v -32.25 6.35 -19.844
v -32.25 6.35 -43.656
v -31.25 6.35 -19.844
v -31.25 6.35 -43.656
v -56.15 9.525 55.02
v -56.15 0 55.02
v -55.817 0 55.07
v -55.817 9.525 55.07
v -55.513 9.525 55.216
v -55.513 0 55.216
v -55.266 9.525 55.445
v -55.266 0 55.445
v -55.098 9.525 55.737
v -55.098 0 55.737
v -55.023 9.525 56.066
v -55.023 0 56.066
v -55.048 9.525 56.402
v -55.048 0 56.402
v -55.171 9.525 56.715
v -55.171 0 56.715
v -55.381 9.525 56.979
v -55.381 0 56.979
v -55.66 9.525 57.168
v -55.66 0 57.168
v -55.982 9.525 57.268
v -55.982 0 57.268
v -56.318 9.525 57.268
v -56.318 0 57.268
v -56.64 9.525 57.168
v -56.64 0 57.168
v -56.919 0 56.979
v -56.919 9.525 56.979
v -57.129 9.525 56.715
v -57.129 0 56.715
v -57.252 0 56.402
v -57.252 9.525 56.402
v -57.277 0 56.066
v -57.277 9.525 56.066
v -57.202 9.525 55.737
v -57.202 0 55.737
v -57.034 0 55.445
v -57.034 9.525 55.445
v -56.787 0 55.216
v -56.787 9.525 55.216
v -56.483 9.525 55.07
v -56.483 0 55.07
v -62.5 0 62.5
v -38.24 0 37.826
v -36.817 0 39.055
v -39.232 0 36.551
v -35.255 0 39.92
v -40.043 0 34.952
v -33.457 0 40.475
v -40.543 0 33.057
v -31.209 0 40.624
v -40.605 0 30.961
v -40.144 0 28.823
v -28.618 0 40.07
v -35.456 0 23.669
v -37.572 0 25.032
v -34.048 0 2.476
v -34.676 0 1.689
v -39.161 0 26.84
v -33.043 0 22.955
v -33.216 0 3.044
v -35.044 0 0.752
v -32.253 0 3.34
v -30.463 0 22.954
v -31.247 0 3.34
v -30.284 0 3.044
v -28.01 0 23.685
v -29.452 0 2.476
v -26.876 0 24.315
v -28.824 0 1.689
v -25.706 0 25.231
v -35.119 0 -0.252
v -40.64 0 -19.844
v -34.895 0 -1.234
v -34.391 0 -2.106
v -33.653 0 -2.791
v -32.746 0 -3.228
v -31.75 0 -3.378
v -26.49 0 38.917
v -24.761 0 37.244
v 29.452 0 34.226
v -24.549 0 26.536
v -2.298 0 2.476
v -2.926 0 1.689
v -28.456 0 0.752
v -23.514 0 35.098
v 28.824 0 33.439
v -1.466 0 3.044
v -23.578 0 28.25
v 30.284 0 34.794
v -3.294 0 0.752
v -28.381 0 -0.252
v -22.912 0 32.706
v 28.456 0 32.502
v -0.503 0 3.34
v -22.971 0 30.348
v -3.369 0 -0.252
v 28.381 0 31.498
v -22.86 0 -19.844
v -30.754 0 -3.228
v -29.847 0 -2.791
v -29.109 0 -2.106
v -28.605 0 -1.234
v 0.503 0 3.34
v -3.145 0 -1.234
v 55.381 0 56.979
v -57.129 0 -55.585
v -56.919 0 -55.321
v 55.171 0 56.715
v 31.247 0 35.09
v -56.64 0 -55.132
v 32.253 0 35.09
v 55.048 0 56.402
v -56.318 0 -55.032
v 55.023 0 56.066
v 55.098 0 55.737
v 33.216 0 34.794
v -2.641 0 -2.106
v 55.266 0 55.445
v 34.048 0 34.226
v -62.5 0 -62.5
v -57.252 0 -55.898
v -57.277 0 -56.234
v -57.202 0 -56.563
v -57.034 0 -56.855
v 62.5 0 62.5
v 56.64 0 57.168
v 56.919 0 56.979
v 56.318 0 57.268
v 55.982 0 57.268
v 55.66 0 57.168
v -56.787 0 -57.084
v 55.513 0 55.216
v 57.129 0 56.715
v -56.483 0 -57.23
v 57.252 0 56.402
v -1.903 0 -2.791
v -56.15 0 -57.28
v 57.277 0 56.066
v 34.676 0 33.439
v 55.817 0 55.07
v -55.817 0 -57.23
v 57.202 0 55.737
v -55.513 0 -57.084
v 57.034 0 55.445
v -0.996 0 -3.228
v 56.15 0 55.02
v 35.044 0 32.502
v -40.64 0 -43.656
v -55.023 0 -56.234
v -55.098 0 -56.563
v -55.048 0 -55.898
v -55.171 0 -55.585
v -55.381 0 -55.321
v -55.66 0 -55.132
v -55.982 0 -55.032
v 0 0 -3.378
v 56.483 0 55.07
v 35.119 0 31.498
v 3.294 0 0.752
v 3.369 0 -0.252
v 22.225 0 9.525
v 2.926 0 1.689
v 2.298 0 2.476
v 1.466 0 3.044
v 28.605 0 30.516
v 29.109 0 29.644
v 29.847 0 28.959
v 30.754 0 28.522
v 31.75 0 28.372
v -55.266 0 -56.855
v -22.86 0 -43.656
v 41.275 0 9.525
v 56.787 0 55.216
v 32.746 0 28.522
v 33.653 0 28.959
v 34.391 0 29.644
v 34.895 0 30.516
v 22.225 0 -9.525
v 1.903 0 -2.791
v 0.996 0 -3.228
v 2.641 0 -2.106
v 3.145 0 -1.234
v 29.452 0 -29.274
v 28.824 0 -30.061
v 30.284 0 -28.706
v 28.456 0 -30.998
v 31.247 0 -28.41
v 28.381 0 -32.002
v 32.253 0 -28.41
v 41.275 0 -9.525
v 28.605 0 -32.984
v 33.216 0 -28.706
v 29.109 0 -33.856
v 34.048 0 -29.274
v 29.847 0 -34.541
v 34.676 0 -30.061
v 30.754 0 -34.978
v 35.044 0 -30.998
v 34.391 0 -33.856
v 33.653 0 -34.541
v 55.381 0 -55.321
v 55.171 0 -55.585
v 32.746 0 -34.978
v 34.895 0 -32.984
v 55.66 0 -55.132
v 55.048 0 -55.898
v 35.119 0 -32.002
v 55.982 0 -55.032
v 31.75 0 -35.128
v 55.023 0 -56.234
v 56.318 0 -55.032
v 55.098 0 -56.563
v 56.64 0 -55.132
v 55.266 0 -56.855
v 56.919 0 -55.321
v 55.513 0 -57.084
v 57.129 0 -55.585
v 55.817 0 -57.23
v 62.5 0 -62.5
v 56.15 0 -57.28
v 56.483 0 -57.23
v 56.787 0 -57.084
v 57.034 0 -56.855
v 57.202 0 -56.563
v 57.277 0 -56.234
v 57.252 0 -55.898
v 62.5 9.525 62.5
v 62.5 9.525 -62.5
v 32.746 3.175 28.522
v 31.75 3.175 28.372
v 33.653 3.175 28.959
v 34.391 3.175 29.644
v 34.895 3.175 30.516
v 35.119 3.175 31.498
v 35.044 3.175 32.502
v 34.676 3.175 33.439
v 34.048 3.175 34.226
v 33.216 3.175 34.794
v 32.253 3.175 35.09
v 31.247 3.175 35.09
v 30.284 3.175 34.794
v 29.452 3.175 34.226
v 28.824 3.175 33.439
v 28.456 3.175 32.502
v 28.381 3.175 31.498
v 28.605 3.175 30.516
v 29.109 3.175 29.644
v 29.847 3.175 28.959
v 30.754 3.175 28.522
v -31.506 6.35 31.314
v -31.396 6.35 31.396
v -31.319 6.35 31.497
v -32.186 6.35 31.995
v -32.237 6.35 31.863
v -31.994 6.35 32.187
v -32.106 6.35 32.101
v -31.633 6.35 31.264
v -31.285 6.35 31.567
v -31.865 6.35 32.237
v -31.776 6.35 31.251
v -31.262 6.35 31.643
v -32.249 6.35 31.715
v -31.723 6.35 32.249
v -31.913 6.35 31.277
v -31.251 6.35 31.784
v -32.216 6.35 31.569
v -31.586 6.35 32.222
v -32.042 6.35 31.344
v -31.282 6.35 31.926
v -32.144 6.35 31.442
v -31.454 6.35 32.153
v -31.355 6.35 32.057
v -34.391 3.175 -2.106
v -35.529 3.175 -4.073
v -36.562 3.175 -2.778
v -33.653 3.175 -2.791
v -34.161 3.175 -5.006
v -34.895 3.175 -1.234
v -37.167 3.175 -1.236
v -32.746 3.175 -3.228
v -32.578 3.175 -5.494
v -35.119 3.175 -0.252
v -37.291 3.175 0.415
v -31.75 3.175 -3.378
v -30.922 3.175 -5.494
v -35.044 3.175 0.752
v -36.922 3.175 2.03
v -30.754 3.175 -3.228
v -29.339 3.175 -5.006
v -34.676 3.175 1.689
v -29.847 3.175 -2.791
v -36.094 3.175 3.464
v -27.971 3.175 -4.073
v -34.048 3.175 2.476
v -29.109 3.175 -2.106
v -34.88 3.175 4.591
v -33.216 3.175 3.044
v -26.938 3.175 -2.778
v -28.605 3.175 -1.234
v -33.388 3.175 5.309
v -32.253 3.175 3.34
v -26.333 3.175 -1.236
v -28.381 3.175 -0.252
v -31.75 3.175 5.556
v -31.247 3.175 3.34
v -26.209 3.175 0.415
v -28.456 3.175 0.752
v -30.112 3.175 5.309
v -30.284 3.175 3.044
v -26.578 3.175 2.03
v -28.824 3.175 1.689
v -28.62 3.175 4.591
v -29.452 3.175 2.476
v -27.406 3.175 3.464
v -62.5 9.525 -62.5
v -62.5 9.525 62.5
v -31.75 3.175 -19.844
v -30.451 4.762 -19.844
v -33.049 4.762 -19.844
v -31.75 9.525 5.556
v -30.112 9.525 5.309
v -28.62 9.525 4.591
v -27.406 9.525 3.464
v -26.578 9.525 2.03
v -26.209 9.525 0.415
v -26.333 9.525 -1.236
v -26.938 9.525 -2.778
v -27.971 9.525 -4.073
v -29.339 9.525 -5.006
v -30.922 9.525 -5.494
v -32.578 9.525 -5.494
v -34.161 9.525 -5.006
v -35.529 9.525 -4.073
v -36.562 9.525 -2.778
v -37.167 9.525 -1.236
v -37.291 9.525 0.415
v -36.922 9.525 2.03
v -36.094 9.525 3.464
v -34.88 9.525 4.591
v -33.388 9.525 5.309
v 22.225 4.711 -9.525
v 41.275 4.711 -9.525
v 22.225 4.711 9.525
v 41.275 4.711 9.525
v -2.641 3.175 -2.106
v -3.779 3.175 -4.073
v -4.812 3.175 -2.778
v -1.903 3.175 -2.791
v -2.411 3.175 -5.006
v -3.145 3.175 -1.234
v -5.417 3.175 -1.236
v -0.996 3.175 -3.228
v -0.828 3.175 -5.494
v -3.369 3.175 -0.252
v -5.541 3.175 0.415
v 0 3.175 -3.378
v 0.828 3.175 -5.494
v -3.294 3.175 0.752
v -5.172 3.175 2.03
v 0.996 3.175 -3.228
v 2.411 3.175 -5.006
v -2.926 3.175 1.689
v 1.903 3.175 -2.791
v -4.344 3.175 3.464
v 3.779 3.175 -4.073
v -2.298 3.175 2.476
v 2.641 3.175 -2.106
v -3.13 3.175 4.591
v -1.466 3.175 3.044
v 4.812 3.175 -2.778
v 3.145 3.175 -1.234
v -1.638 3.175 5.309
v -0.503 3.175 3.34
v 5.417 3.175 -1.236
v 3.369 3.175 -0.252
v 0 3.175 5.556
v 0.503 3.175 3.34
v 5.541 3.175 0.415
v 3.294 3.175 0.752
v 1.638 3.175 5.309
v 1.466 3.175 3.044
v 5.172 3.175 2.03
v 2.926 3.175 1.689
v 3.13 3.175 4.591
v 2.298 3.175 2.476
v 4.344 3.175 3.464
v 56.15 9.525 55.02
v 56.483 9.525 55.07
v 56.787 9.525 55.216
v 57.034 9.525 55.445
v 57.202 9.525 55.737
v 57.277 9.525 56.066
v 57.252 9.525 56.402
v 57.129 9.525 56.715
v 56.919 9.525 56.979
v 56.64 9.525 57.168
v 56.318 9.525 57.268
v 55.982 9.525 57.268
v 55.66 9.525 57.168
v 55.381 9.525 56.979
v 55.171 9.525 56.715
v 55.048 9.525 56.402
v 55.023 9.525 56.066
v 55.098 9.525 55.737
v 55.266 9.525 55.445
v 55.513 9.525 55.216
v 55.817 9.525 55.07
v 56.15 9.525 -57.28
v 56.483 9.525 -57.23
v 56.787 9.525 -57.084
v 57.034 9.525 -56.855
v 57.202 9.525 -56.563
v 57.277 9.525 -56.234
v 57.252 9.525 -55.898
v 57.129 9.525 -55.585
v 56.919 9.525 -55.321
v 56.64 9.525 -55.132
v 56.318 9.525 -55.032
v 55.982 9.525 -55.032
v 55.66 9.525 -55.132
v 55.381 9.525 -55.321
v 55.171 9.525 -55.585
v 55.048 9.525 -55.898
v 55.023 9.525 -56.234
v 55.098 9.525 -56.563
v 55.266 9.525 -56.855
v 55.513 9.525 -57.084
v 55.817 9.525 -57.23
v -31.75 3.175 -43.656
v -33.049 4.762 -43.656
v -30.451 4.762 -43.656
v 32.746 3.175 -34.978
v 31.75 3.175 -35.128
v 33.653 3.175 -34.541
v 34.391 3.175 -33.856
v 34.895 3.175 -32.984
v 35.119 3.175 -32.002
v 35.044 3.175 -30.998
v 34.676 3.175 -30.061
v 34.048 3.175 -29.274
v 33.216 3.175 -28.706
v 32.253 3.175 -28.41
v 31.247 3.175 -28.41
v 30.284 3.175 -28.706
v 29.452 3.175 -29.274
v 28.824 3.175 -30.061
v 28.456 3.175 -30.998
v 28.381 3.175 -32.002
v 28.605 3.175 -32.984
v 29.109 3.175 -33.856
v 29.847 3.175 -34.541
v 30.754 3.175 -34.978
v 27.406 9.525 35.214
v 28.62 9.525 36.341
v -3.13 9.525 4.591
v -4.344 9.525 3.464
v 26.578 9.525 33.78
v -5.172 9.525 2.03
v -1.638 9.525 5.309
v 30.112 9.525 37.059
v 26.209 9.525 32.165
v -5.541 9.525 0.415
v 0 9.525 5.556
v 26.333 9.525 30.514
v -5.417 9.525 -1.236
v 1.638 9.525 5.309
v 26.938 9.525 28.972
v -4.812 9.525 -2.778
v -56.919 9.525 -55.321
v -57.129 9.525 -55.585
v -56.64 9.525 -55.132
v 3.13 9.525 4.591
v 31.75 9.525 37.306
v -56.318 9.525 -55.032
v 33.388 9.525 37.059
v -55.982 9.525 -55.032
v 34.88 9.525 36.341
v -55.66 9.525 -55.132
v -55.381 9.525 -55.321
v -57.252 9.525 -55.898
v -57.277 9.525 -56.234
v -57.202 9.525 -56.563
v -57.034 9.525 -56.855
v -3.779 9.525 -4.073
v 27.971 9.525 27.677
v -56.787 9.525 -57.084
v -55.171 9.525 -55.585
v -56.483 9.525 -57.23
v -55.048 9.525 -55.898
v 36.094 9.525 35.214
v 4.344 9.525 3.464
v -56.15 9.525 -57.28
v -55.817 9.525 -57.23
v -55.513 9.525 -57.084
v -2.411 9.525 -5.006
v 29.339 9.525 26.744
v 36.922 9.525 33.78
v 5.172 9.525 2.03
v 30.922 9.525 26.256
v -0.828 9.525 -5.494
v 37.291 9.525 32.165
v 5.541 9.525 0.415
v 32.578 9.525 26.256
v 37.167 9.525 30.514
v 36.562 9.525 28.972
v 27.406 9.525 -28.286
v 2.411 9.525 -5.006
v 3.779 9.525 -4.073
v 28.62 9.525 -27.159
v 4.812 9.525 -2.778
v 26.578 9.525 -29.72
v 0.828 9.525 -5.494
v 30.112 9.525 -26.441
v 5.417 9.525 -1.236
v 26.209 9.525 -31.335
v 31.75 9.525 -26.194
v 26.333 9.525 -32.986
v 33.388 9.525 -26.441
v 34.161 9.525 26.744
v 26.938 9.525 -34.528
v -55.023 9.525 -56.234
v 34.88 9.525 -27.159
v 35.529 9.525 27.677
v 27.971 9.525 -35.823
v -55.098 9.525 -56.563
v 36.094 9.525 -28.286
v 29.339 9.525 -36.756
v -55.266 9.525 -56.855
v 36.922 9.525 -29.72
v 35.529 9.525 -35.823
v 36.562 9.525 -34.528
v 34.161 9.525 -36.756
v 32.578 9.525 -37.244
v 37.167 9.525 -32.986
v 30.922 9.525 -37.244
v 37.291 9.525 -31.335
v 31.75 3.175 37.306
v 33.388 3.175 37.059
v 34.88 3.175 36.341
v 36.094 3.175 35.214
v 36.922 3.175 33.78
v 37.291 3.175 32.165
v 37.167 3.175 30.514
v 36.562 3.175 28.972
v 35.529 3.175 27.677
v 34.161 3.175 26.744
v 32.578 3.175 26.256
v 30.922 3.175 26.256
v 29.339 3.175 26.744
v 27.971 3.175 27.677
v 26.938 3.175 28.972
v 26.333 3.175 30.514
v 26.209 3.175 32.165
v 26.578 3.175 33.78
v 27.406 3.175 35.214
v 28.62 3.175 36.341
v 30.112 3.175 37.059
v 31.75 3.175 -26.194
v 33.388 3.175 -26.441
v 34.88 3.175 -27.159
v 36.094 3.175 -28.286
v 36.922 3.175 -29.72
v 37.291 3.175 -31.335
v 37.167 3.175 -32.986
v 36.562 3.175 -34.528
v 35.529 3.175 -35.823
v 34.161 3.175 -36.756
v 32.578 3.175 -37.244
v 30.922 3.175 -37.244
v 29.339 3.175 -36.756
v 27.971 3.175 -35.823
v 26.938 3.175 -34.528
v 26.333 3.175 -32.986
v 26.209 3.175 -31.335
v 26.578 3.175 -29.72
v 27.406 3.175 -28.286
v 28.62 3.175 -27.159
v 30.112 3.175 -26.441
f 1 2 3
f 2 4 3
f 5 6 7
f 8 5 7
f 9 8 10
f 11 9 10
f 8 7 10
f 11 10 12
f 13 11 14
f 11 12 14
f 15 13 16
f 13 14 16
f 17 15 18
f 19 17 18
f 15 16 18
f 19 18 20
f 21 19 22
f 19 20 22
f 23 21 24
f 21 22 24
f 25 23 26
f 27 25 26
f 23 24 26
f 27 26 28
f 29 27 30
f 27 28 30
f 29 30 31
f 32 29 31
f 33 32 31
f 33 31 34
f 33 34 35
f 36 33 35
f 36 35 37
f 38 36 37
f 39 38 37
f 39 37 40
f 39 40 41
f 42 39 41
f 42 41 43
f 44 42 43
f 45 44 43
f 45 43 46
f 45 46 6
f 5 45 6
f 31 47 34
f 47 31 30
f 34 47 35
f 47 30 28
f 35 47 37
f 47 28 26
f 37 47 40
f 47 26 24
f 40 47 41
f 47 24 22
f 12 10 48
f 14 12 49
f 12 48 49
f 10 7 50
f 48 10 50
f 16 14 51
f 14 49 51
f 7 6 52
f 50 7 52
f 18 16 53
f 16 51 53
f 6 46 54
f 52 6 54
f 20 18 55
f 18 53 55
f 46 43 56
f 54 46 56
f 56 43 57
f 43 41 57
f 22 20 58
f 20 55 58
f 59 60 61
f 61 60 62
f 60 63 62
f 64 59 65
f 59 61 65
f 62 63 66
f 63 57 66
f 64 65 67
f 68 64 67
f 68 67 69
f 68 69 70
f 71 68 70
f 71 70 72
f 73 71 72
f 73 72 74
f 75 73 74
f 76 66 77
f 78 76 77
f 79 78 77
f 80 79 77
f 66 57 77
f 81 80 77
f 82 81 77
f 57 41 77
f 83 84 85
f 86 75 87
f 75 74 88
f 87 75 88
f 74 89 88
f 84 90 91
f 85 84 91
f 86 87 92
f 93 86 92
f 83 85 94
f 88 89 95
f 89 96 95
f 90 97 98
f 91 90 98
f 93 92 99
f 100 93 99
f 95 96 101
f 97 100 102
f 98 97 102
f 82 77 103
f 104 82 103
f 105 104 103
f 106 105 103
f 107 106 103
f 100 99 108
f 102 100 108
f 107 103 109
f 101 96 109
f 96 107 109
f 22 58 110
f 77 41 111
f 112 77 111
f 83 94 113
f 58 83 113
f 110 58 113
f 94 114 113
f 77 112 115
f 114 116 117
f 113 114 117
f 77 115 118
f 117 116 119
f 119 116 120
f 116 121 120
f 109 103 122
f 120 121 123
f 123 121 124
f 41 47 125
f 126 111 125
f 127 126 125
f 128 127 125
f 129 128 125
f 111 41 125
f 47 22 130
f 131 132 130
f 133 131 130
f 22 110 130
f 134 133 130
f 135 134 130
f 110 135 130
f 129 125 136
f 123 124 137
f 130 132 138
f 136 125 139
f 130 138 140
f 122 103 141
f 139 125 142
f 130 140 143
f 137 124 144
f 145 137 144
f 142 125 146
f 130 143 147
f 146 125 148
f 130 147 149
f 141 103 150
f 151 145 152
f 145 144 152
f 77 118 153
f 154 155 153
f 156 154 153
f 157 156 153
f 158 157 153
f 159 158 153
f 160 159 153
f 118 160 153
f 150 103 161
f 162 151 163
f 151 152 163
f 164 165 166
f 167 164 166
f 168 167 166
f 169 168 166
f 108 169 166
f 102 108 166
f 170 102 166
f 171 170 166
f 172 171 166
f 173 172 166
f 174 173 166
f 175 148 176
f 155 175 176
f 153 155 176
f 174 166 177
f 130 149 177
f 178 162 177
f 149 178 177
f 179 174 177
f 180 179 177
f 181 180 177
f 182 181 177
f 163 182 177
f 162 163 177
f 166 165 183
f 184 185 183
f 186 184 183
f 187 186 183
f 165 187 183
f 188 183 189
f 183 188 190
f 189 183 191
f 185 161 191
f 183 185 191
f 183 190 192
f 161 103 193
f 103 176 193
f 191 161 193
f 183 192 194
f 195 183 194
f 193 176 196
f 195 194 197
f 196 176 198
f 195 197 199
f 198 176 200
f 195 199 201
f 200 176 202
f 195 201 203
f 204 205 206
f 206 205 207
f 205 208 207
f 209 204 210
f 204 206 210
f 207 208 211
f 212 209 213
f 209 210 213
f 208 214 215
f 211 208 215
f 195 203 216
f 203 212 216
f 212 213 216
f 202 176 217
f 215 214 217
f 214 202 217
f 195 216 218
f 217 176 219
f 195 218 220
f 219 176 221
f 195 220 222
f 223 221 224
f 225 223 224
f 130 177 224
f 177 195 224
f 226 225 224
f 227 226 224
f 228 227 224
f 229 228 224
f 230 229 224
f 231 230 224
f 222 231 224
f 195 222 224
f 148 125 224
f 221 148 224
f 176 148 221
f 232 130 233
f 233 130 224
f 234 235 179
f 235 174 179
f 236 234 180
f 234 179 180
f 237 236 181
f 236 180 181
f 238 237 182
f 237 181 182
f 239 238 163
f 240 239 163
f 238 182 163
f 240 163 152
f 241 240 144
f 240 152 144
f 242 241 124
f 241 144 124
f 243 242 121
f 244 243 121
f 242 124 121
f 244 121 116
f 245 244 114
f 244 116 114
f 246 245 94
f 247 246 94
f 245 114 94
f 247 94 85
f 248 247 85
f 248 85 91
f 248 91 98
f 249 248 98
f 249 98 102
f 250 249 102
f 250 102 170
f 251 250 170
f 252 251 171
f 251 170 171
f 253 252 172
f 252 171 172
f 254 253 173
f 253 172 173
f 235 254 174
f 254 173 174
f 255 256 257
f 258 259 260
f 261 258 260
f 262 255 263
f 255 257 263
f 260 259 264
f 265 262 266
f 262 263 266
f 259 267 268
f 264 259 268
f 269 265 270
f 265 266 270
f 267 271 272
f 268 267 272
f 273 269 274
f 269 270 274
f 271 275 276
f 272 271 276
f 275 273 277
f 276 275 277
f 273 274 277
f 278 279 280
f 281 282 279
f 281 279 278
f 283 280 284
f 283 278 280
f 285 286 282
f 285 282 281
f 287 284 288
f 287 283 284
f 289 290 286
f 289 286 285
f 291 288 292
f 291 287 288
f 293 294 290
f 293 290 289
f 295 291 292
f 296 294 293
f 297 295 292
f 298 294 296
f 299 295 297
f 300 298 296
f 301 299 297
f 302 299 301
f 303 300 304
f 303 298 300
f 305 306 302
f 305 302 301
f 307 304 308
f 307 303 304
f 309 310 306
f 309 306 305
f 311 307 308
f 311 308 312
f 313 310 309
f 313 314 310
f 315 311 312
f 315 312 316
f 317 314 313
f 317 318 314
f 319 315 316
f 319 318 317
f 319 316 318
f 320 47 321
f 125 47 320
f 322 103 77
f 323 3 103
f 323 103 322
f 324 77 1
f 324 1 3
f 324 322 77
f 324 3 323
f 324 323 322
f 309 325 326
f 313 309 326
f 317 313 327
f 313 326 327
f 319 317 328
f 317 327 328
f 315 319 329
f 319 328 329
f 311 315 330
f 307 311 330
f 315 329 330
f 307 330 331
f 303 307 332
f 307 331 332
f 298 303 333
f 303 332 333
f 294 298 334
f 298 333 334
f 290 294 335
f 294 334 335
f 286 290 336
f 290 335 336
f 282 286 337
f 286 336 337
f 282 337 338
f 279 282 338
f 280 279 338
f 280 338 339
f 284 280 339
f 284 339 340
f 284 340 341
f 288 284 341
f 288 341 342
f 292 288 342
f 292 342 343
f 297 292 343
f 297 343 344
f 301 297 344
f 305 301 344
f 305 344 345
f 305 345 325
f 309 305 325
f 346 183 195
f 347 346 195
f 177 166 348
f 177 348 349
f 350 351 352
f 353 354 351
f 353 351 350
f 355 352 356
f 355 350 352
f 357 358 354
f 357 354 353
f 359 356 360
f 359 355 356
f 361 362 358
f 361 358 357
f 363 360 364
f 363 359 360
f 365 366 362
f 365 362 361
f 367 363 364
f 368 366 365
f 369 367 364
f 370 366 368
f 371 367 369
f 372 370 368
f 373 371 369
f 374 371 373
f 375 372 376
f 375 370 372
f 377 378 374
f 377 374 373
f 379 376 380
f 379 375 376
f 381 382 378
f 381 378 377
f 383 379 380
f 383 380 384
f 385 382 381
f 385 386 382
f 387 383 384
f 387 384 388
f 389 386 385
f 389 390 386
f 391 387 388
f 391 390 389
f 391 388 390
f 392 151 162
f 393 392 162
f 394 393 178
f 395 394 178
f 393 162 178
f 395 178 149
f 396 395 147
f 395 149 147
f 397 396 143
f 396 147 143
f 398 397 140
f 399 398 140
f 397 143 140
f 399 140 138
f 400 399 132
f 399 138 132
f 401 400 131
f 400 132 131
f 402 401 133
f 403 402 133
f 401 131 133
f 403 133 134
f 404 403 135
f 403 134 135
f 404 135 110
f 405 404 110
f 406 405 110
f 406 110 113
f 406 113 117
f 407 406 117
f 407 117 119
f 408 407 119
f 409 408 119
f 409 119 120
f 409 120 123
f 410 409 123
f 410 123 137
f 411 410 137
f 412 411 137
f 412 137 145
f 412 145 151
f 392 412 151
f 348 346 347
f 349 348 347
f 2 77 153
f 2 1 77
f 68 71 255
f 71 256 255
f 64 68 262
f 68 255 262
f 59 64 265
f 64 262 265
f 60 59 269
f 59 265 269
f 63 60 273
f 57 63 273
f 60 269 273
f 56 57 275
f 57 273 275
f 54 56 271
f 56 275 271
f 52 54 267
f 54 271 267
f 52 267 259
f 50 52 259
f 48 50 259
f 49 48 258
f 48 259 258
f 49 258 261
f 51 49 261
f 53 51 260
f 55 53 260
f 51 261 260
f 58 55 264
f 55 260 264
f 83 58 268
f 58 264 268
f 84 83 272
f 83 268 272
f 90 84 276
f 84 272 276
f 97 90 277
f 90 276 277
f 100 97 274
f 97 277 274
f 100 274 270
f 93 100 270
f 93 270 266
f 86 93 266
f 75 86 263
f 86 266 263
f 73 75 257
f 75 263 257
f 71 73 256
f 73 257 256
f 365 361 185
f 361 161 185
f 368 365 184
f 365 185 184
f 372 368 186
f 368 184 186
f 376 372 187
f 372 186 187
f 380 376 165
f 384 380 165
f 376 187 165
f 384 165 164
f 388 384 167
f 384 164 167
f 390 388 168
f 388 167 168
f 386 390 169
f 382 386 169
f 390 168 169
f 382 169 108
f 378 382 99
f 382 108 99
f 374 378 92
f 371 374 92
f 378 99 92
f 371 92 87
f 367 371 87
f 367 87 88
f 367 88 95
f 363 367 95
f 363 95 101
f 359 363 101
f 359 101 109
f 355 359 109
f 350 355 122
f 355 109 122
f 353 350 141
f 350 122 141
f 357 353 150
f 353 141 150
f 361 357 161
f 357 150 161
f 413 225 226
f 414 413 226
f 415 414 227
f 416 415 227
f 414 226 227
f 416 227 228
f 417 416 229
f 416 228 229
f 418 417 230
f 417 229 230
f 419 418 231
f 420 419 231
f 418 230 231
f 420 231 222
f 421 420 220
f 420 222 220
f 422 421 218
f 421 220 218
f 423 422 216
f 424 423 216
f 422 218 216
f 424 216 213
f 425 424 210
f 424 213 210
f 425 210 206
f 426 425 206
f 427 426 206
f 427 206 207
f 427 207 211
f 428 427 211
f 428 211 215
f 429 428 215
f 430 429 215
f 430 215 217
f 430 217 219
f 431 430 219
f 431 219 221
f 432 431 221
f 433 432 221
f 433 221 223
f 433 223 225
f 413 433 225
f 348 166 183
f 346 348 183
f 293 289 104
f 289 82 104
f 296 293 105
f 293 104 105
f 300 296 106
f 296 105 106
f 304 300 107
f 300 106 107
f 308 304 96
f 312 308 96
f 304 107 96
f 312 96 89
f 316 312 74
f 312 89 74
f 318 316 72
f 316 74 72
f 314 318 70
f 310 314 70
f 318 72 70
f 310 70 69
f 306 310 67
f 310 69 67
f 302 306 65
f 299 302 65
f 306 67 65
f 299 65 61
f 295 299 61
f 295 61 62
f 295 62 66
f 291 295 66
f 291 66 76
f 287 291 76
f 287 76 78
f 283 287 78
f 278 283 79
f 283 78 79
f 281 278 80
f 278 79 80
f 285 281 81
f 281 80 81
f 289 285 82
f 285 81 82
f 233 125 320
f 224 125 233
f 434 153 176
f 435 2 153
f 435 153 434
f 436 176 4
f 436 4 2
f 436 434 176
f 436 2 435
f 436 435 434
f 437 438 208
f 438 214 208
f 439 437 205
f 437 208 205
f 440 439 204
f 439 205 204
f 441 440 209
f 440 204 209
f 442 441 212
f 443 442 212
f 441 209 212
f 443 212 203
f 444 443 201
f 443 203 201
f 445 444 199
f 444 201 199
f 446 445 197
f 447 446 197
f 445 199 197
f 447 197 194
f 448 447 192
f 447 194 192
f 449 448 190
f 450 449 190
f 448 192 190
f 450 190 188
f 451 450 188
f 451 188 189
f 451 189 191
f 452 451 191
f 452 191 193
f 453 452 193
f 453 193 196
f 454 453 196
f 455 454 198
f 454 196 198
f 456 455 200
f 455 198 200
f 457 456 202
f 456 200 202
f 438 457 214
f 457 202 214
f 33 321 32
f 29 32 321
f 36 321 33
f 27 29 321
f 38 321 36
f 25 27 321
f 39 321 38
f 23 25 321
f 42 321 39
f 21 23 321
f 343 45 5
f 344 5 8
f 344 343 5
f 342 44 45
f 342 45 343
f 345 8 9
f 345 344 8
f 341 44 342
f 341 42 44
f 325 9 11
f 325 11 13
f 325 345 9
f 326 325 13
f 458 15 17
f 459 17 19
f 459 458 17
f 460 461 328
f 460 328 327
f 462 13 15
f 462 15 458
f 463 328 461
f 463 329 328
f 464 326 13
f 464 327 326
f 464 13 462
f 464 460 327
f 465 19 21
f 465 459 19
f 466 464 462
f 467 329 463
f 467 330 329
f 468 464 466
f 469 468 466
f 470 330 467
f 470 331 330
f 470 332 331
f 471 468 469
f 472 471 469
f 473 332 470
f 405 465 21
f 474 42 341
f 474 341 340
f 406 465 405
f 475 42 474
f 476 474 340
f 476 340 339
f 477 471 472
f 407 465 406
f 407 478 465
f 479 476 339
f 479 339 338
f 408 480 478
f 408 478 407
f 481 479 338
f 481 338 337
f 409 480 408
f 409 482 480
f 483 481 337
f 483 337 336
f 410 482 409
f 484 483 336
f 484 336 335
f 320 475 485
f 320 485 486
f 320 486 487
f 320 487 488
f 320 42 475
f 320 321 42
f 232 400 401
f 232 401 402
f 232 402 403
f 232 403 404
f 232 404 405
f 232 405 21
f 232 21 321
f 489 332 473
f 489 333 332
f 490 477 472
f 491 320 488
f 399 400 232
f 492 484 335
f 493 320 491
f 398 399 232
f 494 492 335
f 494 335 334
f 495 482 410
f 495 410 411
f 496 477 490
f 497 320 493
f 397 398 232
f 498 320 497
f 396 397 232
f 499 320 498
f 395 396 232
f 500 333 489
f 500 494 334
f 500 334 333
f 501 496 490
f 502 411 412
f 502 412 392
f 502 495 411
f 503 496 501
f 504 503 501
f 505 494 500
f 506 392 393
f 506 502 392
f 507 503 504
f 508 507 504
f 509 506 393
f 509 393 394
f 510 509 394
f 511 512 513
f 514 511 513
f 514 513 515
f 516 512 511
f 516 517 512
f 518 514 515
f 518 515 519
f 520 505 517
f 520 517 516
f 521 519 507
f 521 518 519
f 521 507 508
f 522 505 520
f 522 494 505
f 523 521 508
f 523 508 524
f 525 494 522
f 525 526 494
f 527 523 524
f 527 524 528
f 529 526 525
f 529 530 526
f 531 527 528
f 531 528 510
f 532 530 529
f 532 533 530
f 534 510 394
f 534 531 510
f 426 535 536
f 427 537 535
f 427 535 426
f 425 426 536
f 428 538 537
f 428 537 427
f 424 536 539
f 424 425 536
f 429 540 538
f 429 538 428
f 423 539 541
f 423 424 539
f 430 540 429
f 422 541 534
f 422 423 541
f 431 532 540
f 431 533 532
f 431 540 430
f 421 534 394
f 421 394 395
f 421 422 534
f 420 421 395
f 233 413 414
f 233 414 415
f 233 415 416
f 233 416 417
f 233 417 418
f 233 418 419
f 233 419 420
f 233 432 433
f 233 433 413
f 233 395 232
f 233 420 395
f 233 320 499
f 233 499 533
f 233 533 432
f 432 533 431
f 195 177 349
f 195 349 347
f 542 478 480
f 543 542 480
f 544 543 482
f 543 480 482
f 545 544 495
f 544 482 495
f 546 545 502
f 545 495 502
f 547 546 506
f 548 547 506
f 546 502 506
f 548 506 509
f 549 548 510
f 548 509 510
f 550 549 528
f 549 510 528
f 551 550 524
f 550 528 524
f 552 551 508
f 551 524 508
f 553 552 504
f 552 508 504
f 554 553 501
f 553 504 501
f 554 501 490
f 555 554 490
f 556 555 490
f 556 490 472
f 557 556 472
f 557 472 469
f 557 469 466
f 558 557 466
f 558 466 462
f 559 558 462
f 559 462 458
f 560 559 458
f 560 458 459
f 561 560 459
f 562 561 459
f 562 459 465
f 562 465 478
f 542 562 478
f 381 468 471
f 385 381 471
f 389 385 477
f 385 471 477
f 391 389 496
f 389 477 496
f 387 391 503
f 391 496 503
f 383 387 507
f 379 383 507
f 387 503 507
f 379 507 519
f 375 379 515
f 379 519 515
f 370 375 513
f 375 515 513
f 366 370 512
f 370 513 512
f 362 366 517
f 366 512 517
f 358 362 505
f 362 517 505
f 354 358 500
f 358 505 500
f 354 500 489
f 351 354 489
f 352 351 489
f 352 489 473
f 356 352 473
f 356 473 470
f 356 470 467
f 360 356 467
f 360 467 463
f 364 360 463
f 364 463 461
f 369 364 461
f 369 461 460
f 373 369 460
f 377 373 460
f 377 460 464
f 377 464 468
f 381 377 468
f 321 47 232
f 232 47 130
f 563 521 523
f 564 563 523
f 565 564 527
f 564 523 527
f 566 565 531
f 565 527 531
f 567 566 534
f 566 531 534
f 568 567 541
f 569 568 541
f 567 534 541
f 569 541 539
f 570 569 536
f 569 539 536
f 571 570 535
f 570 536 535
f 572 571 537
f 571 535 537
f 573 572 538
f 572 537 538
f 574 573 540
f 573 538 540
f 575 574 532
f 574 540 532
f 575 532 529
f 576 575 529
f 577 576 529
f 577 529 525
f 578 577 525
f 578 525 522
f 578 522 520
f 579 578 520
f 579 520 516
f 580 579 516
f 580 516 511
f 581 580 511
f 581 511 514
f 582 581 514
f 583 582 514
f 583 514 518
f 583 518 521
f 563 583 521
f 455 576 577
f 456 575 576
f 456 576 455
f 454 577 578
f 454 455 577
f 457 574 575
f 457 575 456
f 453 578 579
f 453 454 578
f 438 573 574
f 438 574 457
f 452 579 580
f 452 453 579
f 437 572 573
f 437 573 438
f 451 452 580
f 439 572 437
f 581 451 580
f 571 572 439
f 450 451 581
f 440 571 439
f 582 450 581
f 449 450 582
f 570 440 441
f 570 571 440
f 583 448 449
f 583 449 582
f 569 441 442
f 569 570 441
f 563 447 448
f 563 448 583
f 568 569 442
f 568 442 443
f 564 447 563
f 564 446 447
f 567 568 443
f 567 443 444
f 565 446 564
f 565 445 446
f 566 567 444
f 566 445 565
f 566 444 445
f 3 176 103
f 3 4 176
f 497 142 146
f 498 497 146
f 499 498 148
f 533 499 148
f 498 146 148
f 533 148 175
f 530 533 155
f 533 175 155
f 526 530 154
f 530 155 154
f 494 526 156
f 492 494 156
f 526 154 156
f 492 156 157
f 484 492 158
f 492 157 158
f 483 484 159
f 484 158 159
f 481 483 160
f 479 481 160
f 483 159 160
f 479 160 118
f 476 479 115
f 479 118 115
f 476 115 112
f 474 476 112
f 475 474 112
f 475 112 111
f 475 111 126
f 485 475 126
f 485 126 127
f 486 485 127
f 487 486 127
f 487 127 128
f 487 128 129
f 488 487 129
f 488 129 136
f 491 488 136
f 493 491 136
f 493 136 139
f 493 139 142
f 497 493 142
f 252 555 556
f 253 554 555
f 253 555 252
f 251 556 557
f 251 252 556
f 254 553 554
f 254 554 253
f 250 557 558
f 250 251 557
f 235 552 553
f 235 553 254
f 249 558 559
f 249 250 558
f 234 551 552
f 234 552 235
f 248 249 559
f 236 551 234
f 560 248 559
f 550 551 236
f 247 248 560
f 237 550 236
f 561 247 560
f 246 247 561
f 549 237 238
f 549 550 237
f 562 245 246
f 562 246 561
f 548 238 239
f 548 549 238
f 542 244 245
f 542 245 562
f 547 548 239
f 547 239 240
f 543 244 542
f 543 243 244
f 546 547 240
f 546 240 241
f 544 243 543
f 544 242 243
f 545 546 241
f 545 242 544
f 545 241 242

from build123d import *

# Parameters (mm, degrees)
PLATES_DIMS_W                                    = 125
PLATES_DIMS_H                                    = 125
PLATE_THICKNESS_DEPTH                            = 9.525
F_4_40_TAPPED_HOLE1_D                            = 2.2606
LPATTERN1_COUNT                                  = 2
LPATTERN1_PITCH                                  = 112.3
LPATTERN1_COUNT_DIR2                             = 2
LPATTERN1_PITCH_DIR2                             = 112.3
FLAT_DIMS_W                                      = 19.05
FLAT_DIMS_H                                      = 19.05
FLAT_CUT_LENGTH_DEPTH                            = 4.7112
CBORE_FOR_1_4_SOCKET_HEAD_CAP_SCREW1_D           = 6.7564
CBORE_FOR_1_4_SOCKET_HEAD_CAP_SCREW1_CBORE_D     = 11.1125
CBORE_FOR_1_4_SOCKET_HEAD_CAP_SCREW1_CBORE_DEPTH = 6.35


with BuildPart() as part:
    # Plates_Dims → Plate_Thickness (new body)
    with BuildSketch(Plane(origin=(0, 0, 0), x_dir=(1, 0, 0), z_dir=(0, 1, 0))):
        Rectangle(PLATES_DIMS_W, PLATES_DIMS_H)
    extrude(amount=PLATE_THICKNESS_DEPTH)

    # #4-40 Tapped Hole1 (through all)
    with Locations(Plane(origin=(56.15, 9.525, 56.15), x_dir=(0, 0, 1), z_dir=(0, 1, 0))):
        with Locations((0, 0)):
            f_4_40_tapped_hole1 = Hole(F_4_40_TAPPED_HOLE1_D / 2)

    # LPattern1: 4-40 Tapped Hole1 2 × 2
    with Locations(*[(-j * LPATTERN1_PITCH_DIR2, 0, -i * LPATTERN1_PITCH) for i in range(LPATTERN1_COUNT) for j in range(LPATTERN1_COUNT_DIR2) if (i, j) != (0, 0)]):
        add(f_4_40_tapped_hole1, mode=Mode.SUBTRACT)

    # Cone_Cut: read off the stored shape, not the designer's step
    # Cone_Cut: loft between two sections, ruled curve by curve
    cone_cut_from = [
        Edge.make_bspline([(-28.010369629, 0, 23.684811553), (-44.140746524, 0, 16.205550811), (-51.620007265, 0, 32.335927706), (-35.489630371, 0, 39.815188447), (-19.359253476, 0, 47.294449189), (-11.879992735, 0, 31.164072294), (-28.010369629, 0, 23.684811553)], [0, 0, 0, 0, 0.5, 0.5, 0.5, 1, 1, 1, 1], 3, [1, 0.333333333, 0.333333333, 1, 0.333333333, 0.333333333, 1]),
    ]
    cone_cut_to = [
        Edge.make_bspline([(-31.396446609, 6.35, 31.396446609), (-32.103553391, 6.35, 30.689339828), (-32.810660172, 6.35, 31.396446609), (-32.103553391, 6.35, 32.103553391), (-31.396446609, 6.35, 32.810660172), (-30.689339828, 6.35, 32.103553391), (-31.396446609, 6.35, 31.396446609)], [0, 0, 0, 0, 0.5, 0.5, 0.5, 1, 1, 1, 1], 3, [1, 0.333333333, 0.333333333, 1, 0.333333333, 0.333333333, 1]),
    ]
    cone_cut = Solid(Shell([*[Face.make_surface_from_curves(cone_cut_from[k], cone_cut_to[k]) for k in range(1)], Face(Wire(cone_cut_from)), Face(Wire(cone_cut_to))]))
    add(cone_cut, mode=Mode.SUBTRACT)

    # Bottom_Groove → Groove_Cut section 0
    with BuildSketch(Plane(origin=(0, 0, 0), x_dir=(1, 0, 0), z_dir=(0, 1, 0))):
        with BuildLine():
            Line((-40.64, 43.65625), (-22.86, 43.65625))
            Line((-22.86, 43.65625), (-22.86, 19.84375))
            Line((-22.86, 19.84375), (-40.64, 19.84375))
            Line((-40.64, 19.84375), (-40.64, 43.65625))
        make_face()
    # Top_Groove → Groove_Cut section 1
    with BuildSketch(Plane(origin=(0, 6.35, 0), x_dir=(-1, 0, 0), z_dir=(0, -1, 0))):
        with BuildLine():
            Line((32.25, 43.65625), (31.25, 43.65625))
            Line((31.25, 43.65625), (31.25, 19.84375))
            Line((31.25, 19.84375), (32.25, 19.84375))
            Line((32.25, 19.84375), (32.25, 43.65625))
        make_face()
    loft(mode=Mode.SUBTRACT)

    # Flat_Dims → Flat_Cut_Length (cut)
    with BuildSketch(Plane(origin=(0, 0, 0), x_dir=(1, 0, 0), z_dir=(0, 1, 0))):
        with Locations((31.75, 0)):
            Rectangle(FLAT_DIMS_W, FLAT_DIMS_H)
    extrude(amount=FLAT_CUT_LENGTH_DEPTH, mode=Mode.SUBTRACT)

    # CBORE for 1/4 Socket Head Cap Screw1 (through all)
    with Locations(Plane(origin=(-31.75, 9.525, 0), x_dir=(0, 0, 1), z_dir=(0, 1, 0))):
        with Locations((0, 0), (31.75, 63.5), (-31.75, 63.5), (0, 31.75)):
            CounterBoreHole(CBORE_FOR_1_4_SOCKET_HEAD_CAP_SCREW1_D / 2, CBORE_FOR_1_4_SOCKET_HEAD_CAP_SCREW1_CBORE_D / 2, CBORE_FOR_1_4_SOCKET_HEAD_CAP_SCREW1_CBORE_DEPTH)


solid = part.part
